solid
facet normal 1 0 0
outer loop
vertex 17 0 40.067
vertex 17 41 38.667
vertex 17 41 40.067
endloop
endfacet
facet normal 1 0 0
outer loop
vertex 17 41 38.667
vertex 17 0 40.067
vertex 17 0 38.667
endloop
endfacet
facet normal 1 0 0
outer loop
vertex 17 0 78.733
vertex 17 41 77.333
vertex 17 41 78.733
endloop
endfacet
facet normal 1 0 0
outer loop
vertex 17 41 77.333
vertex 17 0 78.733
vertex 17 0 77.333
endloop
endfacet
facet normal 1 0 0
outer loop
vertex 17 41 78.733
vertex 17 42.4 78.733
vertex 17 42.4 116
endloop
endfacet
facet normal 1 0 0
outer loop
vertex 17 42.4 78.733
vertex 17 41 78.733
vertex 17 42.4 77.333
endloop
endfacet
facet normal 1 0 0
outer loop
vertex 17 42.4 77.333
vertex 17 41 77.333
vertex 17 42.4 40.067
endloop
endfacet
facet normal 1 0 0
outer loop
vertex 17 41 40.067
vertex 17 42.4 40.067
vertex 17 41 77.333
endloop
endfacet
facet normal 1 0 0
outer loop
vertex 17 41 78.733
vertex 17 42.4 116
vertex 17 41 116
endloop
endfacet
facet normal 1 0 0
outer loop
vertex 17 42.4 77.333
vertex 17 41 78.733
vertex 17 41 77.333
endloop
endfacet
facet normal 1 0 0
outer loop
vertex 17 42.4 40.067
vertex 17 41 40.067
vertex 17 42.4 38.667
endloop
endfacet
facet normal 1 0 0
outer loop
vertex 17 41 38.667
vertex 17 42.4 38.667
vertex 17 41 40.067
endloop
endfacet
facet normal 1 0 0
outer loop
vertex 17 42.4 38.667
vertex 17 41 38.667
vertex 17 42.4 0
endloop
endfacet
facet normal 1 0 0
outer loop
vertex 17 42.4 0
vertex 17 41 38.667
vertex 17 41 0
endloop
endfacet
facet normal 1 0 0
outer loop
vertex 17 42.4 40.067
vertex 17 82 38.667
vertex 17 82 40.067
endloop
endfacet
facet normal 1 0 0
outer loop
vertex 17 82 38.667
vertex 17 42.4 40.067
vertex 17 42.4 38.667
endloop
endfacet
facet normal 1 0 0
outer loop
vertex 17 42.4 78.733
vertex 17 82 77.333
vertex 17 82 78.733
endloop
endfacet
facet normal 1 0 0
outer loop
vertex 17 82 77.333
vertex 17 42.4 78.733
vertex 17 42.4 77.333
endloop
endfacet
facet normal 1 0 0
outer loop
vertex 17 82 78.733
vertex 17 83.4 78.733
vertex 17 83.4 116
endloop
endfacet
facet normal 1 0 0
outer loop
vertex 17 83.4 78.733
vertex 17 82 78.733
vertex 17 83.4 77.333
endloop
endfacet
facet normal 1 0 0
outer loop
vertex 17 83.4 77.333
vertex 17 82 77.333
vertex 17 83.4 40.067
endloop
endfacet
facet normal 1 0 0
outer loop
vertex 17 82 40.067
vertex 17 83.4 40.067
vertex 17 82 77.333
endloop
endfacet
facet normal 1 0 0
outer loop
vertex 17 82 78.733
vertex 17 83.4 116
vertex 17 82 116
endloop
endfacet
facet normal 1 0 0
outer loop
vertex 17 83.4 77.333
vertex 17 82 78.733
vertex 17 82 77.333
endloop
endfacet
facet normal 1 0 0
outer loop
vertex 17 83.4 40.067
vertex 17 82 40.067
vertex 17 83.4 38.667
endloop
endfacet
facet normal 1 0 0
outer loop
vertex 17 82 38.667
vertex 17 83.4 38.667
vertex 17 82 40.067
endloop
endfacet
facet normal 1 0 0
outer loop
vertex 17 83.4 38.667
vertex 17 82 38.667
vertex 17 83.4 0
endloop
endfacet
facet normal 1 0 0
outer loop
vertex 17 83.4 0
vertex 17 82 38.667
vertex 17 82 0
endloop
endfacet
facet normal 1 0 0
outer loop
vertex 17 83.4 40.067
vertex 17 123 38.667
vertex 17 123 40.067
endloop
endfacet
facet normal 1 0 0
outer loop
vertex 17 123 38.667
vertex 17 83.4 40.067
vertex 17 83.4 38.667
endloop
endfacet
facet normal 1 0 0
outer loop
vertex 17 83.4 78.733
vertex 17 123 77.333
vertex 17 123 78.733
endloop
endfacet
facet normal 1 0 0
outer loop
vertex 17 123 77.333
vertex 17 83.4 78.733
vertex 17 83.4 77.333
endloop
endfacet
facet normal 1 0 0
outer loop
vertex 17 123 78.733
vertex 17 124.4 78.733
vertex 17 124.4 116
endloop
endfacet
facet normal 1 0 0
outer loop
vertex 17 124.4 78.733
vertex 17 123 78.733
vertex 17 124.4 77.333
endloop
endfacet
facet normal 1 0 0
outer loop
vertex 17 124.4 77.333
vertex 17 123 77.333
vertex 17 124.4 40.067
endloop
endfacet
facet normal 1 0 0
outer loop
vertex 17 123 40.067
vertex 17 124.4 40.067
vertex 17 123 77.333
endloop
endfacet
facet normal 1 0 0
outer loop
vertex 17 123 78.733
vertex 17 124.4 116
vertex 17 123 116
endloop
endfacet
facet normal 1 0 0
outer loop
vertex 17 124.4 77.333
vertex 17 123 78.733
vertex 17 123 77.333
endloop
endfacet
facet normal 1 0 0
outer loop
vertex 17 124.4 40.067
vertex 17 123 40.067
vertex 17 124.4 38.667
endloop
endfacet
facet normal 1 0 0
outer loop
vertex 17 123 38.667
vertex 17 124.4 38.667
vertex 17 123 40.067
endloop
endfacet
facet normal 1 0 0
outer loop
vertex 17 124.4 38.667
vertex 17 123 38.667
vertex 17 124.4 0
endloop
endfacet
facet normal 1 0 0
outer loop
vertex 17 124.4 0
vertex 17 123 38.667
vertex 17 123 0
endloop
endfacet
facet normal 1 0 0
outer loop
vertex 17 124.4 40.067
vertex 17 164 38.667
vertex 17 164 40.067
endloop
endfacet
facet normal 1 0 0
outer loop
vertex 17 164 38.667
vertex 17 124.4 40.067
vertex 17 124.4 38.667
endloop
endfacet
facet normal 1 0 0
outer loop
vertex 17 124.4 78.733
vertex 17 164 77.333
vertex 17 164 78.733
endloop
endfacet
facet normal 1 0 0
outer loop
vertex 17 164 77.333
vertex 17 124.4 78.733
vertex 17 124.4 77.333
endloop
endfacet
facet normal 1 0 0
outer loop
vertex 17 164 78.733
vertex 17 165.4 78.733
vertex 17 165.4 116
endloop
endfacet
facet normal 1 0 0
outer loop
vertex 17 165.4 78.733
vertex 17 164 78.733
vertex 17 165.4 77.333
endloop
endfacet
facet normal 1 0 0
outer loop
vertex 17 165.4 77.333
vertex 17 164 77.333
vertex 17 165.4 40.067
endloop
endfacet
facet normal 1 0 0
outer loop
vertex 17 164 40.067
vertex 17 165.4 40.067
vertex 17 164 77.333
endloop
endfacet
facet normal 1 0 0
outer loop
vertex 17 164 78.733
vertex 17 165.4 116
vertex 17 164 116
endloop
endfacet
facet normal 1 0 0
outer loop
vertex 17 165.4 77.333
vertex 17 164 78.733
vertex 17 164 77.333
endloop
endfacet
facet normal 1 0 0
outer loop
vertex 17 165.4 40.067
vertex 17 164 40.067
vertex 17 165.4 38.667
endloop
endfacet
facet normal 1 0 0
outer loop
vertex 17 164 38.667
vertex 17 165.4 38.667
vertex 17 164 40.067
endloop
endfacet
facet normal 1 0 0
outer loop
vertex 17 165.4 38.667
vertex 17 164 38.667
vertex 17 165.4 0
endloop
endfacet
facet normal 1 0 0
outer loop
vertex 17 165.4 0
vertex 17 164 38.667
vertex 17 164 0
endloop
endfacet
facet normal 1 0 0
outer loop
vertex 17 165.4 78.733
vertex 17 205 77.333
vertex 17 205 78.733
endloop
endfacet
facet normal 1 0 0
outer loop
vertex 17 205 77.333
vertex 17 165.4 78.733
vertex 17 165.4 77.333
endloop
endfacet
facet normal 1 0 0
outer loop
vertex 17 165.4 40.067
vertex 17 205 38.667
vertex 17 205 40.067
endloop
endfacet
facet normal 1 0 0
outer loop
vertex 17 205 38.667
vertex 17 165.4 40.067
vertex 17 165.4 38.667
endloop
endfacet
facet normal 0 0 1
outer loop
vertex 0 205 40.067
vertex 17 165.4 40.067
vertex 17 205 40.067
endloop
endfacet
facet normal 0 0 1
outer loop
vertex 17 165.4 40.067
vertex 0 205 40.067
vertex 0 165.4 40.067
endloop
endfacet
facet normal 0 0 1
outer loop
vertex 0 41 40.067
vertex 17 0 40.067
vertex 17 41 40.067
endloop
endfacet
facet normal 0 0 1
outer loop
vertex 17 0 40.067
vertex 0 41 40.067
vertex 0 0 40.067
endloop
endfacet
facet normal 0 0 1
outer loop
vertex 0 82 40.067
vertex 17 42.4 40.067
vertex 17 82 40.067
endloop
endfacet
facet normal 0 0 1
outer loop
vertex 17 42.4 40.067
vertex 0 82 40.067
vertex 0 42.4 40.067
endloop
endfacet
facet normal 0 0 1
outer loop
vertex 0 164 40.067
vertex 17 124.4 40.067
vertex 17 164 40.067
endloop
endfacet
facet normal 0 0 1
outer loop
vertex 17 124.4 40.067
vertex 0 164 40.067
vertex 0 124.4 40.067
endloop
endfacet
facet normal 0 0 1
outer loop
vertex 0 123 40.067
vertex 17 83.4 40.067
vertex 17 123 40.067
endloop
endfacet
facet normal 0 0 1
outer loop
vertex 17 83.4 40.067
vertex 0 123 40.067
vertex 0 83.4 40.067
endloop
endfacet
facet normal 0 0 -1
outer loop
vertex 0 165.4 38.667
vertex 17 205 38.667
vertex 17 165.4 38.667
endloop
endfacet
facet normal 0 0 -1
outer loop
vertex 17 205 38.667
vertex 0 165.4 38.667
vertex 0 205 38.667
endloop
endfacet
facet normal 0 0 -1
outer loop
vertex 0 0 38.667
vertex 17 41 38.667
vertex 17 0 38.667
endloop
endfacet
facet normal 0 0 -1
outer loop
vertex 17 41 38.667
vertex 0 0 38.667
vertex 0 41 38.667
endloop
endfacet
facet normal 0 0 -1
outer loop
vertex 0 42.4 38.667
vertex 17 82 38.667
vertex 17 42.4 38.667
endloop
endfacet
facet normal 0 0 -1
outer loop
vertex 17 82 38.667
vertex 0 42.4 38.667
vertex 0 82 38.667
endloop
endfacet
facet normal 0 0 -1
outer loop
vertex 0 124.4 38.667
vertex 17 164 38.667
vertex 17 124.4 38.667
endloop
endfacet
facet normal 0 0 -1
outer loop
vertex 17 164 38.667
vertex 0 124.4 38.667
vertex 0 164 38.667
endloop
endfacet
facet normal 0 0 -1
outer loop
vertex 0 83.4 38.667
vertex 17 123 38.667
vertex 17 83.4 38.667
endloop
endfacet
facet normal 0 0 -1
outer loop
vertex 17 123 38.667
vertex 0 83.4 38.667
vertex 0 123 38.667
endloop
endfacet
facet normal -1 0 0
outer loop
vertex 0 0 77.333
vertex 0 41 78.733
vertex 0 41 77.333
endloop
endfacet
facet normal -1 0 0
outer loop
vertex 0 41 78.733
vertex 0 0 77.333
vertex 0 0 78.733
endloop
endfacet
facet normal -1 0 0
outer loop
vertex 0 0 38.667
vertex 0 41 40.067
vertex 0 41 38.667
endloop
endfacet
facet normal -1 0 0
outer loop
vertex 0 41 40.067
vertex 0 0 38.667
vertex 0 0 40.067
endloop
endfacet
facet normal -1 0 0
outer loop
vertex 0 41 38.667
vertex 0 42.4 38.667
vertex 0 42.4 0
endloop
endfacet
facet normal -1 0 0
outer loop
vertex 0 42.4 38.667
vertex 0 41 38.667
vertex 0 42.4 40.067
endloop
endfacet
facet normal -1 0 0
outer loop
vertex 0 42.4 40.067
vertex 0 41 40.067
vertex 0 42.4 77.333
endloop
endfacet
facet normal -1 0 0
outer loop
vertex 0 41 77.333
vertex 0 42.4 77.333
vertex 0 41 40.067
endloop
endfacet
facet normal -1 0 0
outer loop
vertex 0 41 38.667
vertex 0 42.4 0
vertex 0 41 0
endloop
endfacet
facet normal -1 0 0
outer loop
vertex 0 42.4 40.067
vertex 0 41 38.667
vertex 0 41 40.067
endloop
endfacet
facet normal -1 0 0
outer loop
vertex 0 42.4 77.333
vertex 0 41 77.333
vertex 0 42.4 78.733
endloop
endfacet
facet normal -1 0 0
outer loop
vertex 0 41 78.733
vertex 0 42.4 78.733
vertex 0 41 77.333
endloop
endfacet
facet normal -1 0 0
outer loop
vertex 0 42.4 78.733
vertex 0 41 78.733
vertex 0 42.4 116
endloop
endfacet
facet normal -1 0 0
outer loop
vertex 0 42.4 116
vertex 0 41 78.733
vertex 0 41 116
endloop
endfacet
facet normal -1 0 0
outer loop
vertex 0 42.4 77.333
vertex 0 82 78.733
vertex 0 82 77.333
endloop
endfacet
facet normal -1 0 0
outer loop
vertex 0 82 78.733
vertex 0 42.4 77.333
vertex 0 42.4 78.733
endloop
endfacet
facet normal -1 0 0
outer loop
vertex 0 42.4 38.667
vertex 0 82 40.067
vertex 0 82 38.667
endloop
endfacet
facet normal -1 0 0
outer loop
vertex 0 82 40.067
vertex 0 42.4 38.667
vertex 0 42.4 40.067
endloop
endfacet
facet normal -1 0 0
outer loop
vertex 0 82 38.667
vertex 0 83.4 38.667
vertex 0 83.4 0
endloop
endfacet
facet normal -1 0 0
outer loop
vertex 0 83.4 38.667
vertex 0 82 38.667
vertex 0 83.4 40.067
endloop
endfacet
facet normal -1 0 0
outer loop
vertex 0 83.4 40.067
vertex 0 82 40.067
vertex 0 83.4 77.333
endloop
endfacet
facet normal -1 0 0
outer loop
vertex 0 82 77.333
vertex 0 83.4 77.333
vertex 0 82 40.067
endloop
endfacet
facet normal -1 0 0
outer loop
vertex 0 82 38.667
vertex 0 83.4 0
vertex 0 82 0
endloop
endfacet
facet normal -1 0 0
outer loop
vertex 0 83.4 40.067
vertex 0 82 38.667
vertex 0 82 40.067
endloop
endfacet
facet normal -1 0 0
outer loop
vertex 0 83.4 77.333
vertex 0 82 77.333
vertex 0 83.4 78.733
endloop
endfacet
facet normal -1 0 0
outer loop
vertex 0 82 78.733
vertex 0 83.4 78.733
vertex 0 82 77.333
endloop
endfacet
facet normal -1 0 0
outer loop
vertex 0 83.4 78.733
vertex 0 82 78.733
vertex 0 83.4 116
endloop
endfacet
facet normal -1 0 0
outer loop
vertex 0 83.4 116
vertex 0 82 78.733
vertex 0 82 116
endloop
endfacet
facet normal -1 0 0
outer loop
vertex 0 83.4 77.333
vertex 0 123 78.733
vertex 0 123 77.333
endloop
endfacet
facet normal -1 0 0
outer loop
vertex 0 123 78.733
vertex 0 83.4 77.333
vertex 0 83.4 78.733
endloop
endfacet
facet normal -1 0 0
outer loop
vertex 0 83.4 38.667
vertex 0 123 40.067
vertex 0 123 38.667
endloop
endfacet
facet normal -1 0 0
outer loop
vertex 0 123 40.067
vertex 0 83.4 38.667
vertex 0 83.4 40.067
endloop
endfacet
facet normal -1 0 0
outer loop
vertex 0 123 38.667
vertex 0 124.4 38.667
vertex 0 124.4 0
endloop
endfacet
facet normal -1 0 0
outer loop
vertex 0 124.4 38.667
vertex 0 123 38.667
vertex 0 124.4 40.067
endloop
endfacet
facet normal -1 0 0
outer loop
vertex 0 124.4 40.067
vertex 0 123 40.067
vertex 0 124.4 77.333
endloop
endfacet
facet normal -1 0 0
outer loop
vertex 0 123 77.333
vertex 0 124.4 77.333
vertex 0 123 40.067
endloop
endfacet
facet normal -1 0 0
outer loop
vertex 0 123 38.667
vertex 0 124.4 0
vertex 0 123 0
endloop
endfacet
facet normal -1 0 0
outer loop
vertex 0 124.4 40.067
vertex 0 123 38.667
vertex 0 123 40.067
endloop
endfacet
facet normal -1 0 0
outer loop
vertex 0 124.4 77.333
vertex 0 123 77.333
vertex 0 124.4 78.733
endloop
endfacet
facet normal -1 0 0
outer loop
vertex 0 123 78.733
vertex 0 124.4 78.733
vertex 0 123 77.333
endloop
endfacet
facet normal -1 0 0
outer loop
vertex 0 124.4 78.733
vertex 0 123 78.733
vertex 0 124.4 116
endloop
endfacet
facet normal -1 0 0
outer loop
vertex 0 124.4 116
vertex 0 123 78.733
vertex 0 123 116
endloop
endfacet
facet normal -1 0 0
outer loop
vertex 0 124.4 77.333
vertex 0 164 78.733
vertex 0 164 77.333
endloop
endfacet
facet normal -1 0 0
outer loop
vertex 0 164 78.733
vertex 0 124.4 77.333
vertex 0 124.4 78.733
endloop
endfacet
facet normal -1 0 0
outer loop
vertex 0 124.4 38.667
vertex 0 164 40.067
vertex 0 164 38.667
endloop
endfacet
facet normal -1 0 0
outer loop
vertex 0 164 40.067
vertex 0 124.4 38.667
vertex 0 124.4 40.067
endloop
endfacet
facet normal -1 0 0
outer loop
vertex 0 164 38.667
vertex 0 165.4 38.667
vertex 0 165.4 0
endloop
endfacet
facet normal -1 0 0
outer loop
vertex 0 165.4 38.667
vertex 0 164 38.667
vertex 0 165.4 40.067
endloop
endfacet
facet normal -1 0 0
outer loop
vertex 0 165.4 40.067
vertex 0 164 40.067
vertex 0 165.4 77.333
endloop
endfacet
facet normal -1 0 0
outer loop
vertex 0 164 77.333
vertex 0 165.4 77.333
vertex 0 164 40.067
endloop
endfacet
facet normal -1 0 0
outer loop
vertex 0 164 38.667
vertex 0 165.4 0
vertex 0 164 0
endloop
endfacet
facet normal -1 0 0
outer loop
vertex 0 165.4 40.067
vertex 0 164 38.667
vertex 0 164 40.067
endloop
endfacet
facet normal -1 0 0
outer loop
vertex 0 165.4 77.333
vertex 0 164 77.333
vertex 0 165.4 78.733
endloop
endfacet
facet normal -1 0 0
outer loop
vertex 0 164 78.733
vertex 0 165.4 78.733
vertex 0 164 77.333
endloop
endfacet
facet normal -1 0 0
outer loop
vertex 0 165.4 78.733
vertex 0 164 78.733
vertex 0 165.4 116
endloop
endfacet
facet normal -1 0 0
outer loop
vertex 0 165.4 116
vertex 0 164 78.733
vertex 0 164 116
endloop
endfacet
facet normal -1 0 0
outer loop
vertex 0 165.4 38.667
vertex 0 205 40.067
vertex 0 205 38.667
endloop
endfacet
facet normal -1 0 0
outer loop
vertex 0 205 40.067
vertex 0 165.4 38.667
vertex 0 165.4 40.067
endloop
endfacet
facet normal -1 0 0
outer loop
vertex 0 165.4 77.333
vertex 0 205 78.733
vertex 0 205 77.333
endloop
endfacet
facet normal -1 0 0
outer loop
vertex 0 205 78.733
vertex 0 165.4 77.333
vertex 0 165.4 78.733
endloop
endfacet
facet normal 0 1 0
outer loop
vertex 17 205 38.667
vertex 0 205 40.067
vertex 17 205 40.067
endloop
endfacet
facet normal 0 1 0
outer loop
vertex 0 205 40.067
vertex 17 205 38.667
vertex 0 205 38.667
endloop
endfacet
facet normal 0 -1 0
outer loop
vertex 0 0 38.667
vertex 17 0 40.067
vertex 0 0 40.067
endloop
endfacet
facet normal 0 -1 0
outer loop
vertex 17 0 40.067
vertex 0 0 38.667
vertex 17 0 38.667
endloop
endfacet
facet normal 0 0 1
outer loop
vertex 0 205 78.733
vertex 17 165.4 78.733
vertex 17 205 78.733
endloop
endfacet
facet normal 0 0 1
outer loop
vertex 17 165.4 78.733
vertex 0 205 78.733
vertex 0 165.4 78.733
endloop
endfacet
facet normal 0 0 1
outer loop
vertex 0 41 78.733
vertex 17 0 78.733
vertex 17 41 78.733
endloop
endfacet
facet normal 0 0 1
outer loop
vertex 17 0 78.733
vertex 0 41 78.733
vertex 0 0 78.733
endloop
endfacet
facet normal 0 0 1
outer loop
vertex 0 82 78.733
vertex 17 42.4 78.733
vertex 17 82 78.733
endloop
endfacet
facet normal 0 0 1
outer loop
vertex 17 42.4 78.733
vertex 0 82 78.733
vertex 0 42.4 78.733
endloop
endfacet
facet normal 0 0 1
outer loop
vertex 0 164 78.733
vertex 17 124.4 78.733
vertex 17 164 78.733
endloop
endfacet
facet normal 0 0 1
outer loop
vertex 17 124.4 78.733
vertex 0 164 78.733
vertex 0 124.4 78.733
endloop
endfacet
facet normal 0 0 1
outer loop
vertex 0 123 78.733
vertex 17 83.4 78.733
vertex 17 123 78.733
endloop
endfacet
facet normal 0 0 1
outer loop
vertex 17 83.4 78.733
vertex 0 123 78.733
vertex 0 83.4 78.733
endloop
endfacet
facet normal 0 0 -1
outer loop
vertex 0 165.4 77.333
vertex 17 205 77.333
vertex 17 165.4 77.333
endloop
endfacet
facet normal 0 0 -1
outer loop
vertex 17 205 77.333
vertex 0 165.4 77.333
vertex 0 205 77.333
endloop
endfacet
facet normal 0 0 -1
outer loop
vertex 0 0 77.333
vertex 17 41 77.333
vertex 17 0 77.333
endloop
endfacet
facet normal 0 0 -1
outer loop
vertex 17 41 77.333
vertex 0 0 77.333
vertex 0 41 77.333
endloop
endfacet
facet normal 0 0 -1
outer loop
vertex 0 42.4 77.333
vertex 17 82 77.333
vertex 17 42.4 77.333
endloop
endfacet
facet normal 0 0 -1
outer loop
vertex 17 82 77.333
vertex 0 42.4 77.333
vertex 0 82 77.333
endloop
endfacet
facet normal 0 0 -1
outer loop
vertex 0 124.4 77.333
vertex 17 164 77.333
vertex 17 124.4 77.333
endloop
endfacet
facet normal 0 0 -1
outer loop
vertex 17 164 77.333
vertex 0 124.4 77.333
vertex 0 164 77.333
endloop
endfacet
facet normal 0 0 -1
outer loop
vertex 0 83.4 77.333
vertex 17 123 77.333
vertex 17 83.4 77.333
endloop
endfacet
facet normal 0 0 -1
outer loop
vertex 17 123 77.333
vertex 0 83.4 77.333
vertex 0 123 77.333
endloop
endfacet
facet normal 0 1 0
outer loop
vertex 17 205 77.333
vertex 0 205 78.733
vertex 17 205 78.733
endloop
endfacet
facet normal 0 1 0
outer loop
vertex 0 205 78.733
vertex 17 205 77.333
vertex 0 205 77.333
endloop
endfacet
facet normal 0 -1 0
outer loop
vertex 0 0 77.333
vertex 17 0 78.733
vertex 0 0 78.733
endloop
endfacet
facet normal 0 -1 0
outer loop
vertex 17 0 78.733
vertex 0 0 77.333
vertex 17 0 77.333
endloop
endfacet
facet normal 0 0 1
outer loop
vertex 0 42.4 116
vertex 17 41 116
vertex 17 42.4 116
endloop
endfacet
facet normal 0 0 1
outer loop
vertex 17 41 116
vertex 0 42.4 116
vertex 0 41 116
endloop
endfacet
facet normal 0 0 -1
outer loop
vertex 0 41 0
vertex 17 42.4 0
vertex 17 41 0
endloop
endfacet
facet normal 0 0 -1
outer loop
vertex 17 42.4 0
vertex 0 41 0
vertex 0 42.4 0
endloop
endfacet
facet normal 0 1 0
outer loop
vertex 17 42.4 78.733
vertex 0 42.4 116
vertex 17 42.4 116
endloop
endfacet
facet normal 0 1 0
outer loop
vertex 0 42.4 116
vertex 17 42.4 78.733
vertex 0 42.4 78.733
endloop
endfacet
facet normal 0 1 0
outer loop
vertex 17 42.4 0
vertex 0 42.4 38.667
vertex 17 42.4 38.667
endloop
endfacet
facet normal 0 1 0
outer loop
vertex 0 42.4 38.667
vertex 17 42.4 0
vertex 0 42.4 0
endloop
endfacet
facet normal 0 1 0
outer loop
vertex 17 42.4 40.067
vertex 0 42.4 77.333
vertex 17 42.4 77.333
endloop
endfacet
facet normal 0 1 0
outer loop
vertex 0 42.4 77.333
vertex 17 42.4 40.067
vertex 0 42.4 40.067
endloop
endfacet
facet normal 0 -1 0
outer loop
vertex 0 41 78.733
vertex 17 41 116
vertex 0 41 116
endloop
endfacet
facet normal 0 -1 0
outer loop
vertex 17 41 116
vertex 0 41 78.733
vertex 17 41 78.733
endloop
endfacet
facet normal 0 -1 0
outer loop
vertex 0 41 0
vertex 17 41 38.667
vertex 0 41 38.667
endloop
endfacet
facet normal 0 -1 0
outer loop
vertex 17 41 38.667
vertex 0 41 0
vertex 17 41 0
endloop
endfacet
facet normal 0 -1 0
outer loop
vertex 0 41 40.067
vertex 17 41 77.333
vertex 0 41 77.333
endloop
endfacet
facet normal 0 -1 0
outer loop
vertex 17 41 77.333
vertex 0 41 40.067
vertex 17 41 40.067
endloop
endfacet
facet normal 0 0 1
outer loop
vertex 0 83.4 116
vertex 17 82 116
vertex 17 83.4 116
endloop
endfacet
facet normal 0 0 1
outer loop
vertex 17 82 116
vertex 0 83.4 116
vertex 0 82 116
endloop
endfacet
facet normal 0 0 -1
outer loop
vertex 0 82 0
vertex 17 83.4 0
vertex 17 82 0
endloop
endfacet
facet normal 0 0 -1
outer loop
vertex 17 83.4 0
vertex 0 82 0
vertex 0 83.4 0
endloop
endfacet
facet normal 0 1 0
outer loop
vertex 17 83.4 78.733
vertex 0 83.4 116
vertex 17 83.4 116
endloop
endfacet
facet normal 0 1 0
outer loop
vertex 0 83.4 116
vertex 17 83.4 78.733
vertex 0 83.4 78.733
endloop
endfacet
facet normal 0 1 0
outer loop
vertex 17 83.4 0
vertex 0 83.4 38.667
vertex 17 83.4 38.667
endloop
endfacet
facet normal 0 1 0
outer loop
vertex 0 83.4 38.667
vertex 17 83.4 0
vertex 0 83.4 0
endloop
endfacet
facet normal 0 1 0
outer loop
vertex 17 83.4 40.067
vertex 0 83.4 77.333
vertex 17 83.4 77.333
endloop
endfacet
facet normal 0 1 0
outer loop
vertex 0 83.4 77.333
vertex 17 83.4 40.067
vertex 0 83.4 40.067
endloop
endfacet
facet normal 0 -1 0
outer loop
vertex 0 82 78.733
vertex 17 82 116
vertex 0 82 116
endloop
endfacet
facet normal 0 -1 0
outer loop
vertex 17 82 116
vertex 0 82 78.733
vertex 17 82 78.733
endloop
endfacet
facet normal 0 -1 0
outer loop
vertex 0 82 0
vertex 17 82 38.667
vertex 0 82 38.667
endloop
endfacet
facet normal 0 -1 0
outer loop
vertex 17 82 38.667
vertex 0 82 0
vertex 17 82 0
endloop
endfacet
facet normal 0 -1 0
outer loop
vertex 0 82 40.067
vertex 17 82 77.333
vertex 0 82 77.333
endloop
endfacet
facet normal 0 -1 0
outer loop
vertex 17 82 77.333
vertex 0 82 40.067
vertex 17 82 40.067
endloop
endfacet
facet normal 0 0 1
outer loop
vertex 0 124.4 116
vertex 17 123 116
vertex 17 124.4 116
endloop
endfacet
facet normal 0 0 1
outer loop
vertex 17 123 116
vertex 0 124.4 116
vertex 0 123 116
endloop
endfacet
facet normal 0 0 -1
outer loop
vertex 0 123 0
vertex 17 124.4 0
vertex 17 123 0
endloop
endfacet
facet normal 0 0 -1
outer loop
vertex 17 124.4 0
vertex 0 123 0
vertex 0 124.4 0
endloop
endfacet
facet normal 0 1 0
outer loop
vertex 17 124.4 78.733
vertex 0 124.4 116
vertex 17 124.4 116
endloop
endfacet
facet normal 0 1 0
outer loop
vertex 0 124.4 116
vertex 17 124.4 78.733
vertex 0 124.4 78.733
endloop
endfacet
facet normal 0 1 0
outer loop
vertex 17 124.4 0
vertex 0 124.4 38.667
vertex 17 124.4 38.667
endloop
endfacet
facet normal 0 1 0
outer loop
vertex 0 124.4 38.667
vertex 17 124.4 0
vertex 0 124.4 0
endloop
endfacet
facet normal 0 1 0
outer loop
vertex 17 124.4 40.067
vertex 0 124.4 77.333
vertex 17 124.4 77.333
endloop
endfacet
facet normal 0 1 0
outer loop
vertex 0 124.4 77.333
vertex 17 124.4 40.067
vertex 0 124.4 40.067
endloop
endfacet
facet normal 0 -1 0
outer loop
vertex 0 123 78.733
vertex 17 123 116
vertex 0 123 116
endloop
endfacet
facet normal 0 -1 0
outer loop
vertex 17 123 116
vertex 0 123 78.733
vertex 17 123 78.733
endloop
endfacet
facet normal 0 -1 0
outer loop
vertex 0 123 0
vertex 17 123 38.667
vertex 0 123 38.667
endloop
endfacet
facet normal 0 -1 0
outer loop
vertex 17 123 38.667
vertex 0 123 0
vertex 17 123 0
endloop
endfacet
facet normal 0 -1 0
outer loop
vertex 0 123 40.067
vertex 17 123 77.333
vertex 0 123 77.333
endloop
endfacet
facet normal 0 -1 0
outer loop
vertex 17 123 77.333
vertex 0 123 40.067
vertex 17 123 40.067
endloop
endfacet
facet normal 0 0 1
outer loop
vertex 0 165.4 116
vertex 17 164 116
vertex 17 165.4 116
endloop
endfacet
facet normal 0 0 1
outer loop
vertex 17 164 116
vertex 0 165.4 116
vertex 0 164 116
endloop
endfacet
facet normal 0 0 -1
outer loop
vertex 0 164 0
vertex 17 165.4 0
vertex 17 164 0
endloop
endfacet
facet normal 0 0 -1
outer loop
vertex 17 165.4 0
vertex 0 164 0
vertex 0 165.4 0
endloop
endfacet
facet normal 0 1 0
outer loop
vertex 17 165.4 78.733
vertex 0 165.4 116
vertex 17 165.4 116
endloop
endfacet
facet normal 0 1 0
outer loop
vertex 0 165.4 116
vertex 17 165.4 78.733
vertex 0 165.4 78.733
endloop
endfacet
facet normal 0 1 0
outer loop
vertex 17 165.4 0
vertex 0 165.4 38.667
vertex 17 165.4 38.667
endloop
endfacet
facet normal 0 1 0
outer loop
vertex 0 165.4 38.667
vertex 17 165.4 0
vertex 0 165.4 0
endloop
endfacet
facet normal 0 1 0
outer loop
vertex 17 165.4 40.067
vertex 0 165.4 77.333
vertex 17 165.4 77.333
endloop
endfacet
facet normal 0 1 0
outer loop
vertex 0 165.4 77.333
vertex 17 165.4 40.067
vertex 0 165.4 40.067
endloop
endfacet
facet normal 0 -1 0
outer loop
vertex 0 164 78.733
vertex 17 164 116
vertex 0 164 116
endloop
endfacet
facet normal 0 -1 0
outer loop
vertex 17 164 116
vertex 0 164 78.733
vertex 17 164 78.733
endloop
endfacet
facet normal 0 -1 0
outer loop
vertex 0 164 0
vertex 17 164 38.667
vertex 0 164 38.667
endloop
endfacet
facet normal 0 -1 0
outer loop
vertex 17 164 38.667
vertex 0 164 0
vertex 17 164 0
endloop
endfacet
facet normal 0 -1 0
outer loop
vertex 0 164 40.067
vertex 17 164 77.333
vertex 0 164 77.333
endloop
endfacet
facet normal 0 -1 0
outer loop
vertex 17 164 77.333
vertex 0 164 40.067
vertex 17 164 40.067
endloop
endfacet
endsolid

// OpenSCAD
$fn=50;
Repeat = 23;

Width = 205;
DeltaY = Width/5;

Height = 116;
DeltaX = Height/3;


for (a =[1:2]) {
    translate([0,0,DeltaX*a])
    cube([17,Width,1.6-0.2],0);
}


for (b =[1:4]) {
    translate([0,DeltaY*b,0])
    cube([17,1.6-0.2,Height],0);
}
